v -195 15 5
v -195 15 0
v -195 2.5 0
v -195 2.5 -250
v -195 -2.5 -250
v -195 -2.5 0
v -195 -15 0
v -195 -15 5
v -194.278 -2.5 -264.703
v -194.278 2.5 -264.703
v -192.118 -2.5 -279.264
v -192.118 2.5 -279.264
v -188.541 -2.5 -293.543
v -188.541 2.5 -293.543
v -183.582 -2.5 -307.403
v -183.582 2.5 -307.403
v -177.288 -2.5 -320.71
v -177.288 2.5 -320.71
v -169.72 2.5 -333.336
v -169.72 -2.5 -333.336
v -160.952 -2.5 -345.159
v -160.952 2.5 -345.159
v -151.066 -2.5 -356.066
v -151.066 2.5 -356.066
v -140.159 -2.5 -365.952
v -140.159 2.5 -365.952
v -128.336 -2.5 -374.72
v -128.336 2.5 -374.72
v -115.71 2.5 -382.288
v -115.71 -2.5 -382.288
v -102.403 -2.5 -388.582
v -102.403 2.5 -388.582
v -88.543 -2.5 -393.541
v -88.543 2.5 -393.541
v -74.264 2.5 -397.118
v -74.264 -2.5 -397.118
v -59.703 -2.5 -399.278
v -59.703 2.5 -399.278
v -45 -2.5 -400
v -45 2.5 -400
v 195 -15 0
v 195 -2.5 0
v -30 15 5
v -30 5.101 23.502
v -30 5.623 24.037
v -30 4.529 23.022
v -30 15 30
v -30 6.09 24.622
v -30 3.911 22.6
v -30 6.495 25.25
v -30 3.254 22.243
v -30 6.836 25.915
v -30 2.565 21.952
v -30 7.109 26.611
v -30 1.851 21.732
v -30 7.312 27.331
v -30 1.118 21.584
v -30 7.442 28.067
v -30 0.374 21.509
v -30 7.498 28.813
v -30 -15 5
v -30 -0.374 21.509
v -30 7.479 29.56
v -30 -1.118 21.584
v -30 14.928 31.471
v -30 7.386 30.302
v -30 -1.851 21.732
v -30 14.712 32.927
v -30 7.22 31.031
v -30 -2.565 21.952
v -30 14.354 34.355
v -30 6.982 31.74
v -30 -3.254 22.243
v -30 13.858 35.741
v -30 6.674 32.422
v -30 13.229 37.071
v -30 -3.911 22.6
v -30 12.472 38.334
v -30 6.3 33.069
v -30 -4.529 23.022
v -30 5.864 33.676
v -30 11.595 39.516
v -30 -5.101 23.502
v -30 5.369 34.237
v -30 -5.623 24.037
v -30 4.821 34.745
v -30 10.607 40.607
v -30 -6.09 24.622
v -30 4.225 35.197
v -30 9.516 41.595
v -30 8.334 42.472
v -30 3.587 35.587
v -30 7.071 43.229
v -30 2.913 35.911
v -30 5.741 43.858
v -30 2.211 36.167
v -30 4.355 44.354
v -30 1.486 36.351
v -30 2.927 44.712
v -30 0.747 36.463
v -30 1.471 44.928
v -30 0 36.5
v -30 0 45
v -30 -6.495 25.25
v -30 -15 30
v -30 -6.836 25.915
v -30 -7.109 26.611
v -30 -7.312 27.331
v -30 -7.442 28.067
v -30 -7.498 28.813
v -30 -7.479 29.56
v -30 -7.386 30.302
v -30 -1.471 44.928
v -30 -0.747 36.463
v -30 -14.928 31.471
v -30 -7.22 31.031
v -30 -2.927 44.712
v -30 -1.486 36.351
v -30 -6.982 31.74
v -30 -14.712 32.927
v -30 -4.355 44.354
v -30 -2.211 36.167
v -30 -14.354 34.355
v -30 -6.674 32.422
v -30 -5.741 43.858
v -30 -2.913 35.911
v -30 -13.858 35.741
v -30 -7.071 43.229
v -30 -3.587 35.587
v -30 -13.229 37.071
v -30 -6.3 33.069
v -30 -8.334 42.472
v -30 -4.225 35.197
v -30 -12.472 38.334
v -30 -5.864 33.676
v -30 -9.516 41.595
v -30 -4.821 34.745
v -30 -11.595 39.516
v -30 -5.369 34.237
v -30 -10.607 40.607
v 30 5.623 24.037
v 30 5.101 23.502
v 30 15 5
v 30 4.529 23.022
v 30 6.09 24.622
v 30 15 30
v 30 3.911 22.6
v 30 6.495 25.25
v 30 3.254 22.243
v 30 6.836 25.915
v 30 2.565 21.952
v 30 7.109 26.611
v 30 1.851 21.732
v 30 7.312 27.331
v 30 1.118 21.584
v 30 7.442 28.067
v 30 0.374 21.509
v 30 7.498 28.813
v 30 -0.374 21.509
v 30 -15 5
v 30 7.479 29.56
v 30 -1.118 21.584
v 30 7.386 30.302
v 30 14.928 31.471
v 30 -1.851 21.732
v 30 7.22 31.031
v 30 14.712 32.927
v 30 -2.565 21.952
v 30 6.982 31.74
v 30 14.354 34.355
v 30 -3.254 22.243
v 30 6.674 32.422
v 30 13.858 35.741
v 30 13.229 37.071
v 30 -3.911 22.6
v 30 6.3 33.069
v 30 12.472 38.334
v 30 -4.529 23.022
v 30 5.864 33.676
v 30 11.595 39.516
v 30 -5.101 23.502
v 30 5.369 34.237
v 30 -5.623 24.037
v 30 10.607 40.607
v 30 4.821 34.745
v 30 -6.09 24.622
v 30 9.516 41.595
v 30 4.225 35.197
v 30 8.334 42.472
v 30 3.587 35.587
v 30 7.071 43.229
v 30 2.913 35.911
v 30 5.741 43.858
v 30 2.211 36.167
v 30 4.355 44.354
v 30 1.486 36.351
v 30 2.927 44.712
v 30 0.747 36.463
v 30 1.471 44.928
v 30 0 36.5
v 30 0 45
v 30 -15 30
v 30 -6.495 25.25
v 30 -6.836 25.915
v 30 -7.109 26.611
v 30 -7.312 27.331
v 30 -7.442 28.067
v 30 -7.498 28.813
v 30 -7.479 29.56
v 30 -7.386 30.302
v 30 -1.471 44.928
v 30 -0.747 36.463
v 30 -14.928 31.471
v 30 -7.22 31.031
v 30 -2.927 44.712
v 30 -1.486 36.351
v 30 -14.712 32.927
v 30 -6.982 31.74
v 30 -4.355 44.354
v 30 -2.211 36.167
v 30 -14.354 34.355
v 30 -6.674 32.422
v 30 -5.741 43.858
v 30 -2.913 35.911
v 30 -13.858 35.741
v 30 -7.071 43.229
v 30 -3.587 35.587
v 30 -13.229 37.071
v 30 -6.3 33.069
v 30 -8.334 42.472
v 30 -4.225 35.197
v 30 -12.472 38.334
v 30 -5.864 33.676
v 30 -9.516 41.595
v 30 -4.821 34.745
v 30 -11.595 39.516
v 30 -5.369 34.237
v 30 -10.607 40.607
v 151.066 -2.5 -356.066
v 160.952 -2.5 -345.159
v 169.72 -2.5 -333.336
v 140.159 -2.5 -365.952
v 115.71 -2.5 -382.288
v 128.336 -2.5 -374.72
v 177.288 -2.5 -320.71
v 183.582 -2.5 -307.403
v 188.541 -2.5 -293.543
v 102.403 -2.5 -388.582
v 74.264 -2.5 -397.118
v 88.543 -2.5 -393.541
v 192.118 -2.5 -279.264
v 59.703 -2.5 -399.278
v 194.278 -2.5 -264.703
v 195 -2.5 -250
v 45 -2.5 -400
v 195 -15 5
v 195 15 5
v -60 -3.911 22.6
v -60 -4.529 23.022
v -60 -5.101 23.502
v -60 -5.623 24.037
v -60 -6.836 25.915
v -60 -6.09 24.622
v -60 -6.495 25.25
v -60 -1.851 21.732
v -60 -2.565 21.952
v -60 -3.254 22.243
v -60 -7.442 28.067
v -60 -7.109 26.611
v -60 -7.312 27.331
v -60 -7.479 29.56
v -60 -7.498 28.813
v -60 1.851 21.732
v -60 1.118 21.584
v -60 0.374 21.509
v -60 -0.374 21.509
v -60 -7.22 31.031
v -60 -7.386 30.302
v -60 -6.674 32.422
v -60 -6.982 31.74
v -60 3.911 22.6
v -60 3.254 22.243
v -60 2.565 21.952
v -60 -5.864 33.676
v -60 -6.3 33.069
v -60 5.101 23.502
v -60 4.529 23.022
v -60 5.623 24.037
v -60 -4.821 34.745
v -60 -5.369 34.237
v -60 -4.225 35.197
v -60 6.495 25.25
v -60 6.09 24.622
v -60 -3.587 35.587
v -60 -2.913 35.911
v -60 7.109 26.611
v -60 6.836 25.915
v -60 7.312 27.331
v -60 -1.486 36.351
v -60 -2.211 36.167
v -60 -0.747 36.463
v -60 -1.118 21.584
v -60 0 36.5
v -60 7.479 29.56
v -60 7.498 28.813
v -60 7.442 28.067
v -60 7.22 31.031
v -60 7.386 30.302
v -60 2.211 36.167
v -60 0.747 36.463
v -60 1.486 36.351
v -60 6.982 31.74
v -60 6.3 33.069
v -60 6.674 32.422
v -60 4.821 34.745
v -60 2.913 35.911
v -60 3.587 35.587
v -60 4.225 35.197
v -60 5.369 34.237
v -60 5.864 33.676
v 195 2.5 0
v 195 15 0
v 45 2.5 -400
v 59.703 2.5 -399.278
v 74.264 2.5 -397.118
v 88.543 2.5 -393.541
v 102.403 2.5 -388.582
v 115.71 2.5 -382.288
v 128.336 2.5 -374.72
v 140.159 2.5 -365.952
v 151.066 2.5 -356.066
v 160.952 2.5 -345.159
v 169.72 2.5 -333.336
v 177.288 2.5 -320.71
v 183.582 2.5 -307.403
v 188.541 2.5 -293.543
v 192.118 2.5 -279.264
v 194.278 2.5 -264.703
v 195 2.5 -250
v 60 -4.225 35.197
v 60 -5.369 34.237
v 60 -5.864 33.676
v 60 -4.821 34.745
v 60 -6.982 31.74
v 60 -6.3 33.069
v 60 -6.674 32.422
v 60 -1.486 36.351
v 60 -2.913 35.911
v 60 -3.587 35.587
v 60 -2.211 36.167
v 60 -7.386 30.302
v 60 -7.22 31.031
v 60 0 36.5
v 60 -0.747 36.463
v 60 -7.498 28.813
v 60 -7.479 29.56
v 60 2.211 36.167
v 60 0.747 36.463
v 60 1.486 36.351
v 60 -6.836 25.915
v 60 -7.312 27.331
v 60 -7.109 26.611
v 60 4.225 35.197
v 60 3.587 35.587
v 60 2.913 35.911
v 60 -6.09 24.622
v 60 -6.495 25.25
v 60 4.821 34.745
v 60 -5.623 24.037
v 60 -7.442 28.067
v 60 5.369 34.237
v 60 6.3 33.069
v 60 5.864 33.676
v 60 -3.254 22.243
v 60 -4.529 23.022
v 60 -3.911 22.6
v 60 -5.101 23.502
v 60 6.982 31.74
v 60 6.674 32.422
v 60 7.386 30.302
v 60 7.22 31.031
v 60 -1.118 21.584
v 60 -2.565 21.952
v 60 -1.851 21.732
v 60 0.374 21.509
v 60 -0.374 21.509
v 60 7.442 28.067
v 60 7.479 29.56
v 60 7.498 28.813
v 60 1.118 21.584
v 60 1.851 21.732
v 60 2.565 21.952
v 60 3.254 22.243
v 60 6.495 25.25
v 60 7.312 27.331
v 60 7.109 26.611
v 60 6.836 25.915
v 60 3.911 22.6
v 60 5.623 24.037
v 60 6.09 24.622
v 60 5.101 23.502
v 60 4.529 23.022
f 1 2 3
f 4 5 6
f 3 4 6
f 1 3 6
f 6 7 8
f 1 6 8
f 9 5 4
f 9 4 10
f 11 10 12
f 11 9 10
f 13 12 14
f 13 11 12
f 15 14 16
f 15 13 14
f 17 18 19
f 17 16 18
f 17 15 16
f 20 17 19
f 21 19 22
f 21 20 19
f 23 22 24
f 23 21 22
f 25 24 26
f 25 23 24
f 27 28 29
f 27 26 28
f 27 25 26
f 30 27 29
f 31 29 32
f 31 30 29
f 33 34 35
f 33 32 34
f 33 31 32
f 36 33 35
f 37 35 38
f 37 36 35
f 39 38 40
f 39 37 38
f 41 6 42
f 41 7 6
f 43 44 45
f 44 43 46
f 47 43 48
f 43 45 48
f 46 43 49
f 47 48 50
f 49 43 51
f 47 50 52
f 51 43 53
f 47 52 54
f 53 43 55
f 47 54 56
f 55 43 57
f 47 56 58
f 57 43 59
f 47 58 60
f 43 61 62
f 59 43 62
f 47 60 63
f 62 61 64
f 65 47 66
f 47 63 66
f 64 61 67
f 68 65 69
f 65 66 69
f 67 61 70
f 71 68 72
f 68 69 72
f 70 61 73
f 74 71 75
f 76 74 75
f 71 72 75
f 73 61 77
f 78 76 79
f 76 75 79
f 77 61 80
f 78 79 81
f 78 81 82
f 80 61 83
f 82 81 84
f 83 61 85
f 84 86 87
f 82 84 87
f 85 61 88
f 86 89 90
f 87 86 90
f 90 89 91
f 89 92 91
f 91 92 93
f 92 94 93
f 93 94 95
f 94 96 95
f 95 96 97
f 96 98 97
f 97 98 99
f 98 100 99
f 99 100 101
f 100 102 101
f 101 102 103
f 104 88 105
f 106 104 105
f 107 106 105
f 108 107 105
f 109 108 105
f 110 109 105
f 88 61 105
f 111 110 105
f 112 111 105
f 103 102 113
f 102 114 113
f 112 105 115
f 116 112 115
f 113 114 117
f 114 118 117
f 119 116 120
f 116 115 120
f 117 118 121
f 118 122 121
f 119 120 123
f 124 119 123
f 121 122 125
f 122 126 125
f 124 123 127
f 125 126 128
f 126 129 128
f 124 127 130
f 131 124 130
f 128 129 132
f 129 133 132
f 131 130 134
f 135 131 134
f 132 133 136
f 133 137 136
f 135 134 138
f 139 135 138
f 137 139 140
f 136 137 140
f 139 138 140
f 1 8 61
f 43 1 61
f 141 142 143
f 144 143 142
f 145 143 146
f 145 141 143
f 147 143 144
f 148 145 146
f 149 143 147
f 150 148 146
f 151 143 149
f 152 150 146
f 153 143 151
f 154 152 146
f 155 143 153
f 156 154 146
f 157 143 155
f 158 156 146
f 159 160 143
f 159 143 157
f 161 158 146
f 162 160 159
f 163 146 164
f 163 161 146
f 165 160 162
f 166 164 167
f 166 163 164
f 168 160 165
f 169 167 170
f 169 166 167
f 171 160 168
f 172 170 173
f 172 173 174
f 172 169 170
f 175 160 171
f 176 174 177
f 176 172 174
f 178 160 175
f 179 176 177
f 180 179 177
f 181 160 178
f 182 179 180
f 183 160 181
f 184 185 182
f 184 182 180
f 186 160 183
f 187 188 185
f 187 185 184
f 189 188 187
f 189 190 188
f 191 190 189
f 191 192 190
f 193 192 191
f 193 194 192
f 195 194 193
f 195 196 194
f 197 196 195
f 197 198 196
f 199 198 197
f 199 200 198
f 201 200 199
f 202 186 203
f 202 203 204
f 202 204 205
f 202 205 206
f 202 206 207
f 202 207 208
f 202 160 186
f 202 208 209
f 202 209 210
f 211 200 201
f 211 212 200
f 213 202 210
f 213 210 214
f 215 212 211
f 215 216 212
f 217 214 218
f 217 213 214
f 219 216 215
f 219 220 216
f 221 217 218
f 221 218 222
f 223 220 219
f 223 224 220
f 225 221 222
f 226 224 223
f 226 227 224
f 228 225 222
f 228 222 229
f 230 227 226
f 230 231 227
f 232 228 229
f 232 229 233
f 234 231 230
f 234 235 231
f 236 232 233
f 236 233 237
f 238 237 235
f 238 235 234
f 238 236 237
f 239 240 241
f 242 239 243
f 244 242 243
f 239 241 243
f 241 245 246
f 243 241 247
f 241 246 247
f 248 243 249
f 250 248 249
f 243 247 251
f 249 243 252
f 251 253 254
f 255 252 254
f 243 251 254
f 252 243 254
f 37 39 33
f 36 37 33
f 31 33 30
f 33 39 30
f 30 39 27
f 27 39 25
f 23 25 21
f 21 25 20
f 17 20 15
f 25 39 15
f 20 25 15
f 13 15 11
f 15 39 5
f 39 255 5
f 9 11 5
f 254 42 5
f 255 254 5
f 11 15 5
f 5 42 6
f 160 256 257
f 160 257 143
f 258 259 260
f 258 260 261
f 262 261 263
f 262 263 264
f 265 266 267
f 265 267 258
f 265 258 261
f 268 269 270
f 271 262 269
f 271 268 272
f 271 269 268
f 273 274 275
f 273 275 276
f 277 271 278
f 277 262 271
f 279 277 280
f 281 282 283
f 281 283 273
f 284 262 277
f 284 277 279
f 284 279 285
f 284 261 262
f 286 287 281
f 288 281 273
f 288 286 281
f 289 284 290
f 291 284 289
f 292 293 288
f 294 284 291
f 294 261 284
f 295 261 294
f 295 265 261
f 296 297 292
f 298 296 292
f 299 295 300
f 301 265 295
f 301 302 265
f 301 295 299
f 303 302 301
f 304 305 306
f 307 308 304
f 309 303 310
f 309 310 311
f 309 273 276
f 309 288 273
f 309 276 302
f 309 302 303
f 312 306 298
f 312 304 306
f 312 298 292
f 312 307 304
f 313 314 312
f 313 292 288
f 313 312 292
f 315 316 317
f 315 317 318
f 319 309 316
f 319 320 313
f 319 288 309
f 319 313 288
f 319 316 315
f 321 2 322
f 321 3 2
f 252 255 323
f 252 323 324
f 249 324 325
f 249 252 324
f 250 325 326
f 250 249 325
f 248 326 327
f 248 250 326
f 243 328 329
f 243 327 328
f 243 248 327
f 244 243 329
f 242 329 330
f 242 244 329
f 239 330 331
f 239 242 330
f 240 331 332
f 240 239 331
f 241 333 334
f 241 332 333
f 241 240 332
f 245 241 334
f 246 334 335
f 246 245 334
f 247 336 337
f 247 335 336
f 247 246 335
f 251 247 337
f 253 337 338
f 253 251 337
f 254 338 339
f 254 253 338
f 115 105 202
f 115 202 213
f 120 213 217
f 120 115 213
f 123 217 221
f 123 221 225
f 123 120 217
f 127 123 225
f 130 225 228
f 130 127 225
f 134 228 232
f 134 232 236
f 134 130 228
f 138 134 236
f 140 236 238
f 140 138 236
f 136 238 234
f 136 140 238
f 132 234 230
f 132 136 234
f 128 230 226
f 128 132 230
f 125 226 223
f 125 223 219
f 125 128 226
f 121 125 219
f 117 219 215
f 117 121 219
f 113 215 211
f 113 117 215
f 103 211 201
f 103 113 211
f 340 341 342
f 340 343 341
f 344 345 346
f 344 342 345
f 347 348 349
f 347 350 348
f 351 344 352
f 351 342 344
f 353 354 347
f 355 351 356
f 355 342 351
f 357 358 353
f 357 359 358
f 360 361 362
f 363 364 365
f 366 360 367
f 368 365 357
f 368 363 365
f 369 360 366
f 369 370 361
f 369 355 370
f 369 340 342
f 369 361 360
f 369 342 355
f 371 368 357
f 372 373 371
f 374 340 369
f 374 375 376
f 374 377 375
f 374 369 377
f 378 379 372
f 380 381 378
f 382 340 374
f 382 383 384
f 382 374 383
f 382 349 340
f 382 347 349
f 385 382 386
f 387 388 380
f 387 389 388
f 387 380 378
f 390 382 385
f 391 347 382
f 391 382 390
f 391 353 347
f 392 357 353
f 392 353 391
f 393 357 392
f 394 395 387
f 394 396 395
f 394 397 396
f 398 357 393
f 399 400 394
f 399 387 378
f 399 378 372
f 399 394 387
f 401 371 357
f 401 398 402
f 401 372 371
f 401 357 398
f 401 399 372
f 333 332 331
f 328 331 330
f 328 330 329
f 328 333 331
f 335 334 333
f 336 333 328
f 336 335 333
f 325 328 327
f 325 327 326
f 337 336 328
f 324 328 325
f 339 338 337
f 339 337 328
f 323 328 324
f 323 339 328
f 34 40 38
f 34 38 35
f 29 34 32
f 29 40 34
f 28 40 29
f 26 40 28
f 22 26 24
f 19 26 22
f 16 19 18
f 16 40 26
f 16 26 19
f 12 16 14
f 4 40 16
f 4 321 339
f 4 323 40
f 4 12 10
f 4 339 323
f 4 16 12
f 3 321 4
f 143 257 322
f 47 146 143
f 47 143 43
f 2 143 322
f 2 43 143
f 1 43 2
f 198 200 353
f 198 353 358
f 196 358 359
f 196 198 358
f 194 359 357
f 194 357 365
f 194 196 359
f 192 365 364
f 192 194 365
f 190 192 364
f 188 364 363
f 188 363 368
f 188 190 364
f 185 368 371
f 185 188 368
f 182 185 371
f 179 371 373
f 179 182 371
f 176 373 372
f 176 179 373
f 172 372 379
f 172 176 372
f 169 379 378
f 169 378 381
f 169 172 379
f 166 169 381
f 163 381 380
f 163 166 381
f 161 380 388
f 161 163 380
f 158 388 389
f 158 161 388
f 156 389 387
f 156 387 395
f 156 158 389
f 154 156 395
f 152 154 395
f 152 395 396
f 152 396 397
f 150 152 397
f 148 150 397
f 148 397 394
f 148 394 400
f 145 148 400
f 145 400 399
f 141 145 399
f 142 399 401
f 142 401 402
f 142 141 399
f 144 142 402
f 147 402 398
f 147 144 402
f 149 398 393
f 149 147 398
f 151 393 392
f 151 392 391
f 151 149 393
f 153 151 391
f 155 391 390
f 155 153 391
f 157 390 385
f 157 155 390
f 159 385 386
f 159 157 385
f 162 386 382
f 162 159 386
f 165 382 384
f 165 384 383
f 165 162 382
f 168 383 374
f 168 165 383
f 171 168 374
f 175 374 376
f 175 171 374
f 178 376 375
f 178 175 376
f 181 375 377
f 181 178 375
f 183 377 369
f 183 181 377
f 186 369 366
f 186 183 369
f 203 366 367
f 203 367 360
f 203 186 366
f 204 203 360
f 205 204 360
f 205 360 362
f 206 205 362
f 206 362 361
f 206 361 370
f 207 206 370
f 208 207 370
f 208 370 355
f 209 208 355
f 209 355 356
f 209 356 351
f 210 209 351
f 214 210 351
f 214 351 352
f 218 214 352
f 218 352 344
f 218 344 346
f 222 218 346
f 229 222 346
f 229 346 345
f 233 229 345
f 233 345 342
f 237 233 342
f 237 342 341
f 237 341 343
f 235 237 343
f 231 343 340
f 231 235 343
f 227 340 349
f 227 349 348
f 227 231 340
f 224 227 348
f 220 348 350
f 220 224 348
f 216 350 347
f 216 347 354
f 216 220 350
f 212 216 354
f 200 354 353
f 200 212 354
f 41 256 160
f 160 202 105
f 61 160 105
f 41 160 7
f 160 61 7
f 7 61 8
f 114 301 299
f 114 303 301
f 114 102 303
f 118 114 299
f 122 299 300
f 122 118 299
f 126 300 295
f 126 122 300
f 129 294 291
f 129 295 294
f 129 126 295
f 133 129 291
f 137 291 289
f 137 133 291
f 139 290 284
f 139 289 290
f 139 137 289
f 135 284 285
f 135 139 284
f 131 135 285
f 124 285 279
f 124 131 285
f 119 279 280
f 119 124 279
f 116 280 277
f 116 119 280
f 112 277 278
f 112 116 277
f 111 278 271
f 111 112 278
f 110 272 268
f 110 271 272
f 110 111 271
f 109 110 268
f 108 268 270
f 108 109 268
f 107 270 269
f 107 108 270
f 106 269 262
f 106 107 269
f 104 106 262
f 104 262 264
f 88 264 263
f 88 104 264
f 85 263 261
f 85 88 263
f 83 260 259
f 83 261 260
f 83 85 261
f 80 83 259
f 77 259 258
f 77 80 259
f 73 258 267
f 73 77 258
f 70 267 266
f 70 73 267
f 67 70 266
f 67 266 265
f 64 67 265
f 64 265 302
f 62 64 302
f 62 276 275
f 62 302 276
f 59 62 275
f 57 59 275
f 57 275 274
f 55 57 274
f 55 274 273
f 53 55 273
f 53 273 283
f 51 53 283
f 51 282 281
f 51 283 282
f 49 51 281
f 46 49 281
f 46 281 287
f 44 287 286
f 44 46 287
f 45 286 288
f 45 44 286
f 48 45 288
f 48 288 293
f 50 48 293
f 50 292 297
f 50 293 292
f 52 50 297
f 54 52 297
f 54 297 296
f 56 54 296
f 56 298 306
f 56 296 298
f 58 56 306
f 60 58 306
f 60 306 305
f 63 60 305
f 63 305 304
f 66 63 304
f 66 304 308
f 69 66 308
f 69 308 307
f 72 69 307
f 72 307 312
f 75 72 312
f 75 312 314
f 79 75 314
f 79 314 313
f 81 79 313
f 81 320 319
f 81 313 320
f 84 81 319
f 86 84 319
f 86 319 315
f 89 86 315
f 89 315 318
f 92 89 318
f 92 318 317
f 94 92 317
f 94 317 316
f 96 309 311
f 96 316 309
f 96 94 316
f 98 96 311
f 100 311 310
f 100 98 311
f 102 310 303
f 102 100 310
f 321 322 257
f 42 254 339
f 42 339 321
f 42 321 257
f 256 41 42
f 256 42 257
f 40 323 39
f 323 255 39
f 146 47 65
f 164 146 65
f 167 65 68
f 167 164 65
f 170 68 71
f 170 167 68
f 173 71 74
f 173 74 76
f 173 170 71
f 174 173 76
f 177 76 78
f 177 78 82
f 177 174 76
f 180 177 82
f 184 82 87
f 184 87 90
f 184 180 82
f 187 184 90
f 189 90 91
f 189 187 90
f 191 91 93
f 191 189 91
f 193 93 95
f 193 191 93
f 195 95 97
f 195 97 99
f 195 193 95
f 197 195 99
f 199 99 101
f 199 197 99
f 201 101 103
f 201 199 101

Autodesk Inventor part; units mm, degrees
ref_plane "YZ Plane" through (0, 0, 0) normal (1, 0, 0) x (0, 1, 0)
ref_plane "XZ Plane" through (0, 0, 0) normal (0, 1, 0) x (-1, 0, 0)
ref_plane "XY Plane" through (0, 0, 0) normal (0, 0, 1) x (1, 0, 0)
sketch "panel_sketch" plane through (0, 0, 0) normal (0, 1, 0) x (-1, 0, 0)
  line L0 (195, 0) -> (195, -250)
  line L1 (195, 0) -> (0, 0)
  line L2 (0, 0) -> (0, -400)
  line L3 (0, -400) -> (45, -400)
  arc A0 (45, -400) -> (195, -250) centre (45, -250) ccw
  line L4 (-195, 0) -> (-195, -250)
  line L5 (-195, 0) -> (0, 0)
  line L6 (0, -400) -> (-45, -400)
  arc A1 (-195, -250) -> (-45, -400) centre (-45, -250) ccw
  dimension "d1" = 400
  dimension "d2" = 390
  dimension "d3" = 250
  dimension "d4" = 45
extrude "panel_extrude" add sketch "panel_sketch" along normal mid plane 5
sketch "hinge_sketch" plane through (0, 0, 0) normal (0, 1, 0) x (-1, 0, 0)
  line L0 (195, -250) -> (195, 0) projected
  line L1 (195, 0) -> (195, 5)
  line L2 (195, 5) -> (30, 5)
  line L3 (30, 5) -> (30, 45)
  line L4 (0, 0) -> (0, 150)
  line L5 (195, 0) -> (0, 0)
  line L6 (195, 0) -> (-195, 0) projected
  line L7 (30, 45) -> (0, 45)
  line L8 (-195, 0) -> (-195, 5)
  line L9 (-195, 5) -> (-30, 5)
  line L10 (-30, 5) -> (-30, 45)
  line L11 (-195, 0) -> (0, 0)
  line L12 (-30, 45) -> (0, 45)
  dimension "d8" = 5
  dimension "d9" = 60
  dimension "d10" = 40
  dimension "d19" = 150
extrude "hinge_extrude" add sketch "hinge_sketch" along normal mid plane 30
fillet "hinge_bottom_fillet" radius 15 2 edges at (0, 15, 45) (0, -15, 45)
sketch "hinge_link_sketch" plane through (-30, -15, 5) normal (-1, 0, 0) x (0, 0, 1)
  line L0 (0, 30) -> (25, 30) projected
  arc A0 (25, 0) -> (25, 30) centre (25, 15) ccw projected
  line L1 (25, 0) -> (0, 0) projected
  circle A1 centre (24, 15) radius 7.5
  point P0 (-5, 15)
  point P1 (40, 15)
  dimension "d14" = 15
  dimension "d15" = 16
  dimension "d16" = 15
extrude "hinge_link_extrude" add sketch "hinge_link_sketch" along normal blind 30
mirror "hinge_link_extrude_mirror" about plane through (0, 0, 0) normal (1, 0, 0)
equation "\"d1\" = panel_height"
equation "\"d2\" = panel_width"
equation "\"d3\" = vertical_height"
equation "\"d4\" = 0.5 * panel_width + vertical_height - panel_height"
equation "\"d9\" = hinge_width"
equation "\"d10\" = hinge_height"
equation "\"d11\" = 0.5 * hinge_width"
equation "\"d17\" = 0.5 * hinge_width"
equation "\"panel_height\" = 400"
equation "\"panel_width\" = 390"
equation "\"vertical_height\" = 250"
equation "\"hinge_width\" = 60"
equation "\"hinge_height\" = 40"
properties part number "aperature_panel" material "Stainless Steel AISI 440C, Welded"
